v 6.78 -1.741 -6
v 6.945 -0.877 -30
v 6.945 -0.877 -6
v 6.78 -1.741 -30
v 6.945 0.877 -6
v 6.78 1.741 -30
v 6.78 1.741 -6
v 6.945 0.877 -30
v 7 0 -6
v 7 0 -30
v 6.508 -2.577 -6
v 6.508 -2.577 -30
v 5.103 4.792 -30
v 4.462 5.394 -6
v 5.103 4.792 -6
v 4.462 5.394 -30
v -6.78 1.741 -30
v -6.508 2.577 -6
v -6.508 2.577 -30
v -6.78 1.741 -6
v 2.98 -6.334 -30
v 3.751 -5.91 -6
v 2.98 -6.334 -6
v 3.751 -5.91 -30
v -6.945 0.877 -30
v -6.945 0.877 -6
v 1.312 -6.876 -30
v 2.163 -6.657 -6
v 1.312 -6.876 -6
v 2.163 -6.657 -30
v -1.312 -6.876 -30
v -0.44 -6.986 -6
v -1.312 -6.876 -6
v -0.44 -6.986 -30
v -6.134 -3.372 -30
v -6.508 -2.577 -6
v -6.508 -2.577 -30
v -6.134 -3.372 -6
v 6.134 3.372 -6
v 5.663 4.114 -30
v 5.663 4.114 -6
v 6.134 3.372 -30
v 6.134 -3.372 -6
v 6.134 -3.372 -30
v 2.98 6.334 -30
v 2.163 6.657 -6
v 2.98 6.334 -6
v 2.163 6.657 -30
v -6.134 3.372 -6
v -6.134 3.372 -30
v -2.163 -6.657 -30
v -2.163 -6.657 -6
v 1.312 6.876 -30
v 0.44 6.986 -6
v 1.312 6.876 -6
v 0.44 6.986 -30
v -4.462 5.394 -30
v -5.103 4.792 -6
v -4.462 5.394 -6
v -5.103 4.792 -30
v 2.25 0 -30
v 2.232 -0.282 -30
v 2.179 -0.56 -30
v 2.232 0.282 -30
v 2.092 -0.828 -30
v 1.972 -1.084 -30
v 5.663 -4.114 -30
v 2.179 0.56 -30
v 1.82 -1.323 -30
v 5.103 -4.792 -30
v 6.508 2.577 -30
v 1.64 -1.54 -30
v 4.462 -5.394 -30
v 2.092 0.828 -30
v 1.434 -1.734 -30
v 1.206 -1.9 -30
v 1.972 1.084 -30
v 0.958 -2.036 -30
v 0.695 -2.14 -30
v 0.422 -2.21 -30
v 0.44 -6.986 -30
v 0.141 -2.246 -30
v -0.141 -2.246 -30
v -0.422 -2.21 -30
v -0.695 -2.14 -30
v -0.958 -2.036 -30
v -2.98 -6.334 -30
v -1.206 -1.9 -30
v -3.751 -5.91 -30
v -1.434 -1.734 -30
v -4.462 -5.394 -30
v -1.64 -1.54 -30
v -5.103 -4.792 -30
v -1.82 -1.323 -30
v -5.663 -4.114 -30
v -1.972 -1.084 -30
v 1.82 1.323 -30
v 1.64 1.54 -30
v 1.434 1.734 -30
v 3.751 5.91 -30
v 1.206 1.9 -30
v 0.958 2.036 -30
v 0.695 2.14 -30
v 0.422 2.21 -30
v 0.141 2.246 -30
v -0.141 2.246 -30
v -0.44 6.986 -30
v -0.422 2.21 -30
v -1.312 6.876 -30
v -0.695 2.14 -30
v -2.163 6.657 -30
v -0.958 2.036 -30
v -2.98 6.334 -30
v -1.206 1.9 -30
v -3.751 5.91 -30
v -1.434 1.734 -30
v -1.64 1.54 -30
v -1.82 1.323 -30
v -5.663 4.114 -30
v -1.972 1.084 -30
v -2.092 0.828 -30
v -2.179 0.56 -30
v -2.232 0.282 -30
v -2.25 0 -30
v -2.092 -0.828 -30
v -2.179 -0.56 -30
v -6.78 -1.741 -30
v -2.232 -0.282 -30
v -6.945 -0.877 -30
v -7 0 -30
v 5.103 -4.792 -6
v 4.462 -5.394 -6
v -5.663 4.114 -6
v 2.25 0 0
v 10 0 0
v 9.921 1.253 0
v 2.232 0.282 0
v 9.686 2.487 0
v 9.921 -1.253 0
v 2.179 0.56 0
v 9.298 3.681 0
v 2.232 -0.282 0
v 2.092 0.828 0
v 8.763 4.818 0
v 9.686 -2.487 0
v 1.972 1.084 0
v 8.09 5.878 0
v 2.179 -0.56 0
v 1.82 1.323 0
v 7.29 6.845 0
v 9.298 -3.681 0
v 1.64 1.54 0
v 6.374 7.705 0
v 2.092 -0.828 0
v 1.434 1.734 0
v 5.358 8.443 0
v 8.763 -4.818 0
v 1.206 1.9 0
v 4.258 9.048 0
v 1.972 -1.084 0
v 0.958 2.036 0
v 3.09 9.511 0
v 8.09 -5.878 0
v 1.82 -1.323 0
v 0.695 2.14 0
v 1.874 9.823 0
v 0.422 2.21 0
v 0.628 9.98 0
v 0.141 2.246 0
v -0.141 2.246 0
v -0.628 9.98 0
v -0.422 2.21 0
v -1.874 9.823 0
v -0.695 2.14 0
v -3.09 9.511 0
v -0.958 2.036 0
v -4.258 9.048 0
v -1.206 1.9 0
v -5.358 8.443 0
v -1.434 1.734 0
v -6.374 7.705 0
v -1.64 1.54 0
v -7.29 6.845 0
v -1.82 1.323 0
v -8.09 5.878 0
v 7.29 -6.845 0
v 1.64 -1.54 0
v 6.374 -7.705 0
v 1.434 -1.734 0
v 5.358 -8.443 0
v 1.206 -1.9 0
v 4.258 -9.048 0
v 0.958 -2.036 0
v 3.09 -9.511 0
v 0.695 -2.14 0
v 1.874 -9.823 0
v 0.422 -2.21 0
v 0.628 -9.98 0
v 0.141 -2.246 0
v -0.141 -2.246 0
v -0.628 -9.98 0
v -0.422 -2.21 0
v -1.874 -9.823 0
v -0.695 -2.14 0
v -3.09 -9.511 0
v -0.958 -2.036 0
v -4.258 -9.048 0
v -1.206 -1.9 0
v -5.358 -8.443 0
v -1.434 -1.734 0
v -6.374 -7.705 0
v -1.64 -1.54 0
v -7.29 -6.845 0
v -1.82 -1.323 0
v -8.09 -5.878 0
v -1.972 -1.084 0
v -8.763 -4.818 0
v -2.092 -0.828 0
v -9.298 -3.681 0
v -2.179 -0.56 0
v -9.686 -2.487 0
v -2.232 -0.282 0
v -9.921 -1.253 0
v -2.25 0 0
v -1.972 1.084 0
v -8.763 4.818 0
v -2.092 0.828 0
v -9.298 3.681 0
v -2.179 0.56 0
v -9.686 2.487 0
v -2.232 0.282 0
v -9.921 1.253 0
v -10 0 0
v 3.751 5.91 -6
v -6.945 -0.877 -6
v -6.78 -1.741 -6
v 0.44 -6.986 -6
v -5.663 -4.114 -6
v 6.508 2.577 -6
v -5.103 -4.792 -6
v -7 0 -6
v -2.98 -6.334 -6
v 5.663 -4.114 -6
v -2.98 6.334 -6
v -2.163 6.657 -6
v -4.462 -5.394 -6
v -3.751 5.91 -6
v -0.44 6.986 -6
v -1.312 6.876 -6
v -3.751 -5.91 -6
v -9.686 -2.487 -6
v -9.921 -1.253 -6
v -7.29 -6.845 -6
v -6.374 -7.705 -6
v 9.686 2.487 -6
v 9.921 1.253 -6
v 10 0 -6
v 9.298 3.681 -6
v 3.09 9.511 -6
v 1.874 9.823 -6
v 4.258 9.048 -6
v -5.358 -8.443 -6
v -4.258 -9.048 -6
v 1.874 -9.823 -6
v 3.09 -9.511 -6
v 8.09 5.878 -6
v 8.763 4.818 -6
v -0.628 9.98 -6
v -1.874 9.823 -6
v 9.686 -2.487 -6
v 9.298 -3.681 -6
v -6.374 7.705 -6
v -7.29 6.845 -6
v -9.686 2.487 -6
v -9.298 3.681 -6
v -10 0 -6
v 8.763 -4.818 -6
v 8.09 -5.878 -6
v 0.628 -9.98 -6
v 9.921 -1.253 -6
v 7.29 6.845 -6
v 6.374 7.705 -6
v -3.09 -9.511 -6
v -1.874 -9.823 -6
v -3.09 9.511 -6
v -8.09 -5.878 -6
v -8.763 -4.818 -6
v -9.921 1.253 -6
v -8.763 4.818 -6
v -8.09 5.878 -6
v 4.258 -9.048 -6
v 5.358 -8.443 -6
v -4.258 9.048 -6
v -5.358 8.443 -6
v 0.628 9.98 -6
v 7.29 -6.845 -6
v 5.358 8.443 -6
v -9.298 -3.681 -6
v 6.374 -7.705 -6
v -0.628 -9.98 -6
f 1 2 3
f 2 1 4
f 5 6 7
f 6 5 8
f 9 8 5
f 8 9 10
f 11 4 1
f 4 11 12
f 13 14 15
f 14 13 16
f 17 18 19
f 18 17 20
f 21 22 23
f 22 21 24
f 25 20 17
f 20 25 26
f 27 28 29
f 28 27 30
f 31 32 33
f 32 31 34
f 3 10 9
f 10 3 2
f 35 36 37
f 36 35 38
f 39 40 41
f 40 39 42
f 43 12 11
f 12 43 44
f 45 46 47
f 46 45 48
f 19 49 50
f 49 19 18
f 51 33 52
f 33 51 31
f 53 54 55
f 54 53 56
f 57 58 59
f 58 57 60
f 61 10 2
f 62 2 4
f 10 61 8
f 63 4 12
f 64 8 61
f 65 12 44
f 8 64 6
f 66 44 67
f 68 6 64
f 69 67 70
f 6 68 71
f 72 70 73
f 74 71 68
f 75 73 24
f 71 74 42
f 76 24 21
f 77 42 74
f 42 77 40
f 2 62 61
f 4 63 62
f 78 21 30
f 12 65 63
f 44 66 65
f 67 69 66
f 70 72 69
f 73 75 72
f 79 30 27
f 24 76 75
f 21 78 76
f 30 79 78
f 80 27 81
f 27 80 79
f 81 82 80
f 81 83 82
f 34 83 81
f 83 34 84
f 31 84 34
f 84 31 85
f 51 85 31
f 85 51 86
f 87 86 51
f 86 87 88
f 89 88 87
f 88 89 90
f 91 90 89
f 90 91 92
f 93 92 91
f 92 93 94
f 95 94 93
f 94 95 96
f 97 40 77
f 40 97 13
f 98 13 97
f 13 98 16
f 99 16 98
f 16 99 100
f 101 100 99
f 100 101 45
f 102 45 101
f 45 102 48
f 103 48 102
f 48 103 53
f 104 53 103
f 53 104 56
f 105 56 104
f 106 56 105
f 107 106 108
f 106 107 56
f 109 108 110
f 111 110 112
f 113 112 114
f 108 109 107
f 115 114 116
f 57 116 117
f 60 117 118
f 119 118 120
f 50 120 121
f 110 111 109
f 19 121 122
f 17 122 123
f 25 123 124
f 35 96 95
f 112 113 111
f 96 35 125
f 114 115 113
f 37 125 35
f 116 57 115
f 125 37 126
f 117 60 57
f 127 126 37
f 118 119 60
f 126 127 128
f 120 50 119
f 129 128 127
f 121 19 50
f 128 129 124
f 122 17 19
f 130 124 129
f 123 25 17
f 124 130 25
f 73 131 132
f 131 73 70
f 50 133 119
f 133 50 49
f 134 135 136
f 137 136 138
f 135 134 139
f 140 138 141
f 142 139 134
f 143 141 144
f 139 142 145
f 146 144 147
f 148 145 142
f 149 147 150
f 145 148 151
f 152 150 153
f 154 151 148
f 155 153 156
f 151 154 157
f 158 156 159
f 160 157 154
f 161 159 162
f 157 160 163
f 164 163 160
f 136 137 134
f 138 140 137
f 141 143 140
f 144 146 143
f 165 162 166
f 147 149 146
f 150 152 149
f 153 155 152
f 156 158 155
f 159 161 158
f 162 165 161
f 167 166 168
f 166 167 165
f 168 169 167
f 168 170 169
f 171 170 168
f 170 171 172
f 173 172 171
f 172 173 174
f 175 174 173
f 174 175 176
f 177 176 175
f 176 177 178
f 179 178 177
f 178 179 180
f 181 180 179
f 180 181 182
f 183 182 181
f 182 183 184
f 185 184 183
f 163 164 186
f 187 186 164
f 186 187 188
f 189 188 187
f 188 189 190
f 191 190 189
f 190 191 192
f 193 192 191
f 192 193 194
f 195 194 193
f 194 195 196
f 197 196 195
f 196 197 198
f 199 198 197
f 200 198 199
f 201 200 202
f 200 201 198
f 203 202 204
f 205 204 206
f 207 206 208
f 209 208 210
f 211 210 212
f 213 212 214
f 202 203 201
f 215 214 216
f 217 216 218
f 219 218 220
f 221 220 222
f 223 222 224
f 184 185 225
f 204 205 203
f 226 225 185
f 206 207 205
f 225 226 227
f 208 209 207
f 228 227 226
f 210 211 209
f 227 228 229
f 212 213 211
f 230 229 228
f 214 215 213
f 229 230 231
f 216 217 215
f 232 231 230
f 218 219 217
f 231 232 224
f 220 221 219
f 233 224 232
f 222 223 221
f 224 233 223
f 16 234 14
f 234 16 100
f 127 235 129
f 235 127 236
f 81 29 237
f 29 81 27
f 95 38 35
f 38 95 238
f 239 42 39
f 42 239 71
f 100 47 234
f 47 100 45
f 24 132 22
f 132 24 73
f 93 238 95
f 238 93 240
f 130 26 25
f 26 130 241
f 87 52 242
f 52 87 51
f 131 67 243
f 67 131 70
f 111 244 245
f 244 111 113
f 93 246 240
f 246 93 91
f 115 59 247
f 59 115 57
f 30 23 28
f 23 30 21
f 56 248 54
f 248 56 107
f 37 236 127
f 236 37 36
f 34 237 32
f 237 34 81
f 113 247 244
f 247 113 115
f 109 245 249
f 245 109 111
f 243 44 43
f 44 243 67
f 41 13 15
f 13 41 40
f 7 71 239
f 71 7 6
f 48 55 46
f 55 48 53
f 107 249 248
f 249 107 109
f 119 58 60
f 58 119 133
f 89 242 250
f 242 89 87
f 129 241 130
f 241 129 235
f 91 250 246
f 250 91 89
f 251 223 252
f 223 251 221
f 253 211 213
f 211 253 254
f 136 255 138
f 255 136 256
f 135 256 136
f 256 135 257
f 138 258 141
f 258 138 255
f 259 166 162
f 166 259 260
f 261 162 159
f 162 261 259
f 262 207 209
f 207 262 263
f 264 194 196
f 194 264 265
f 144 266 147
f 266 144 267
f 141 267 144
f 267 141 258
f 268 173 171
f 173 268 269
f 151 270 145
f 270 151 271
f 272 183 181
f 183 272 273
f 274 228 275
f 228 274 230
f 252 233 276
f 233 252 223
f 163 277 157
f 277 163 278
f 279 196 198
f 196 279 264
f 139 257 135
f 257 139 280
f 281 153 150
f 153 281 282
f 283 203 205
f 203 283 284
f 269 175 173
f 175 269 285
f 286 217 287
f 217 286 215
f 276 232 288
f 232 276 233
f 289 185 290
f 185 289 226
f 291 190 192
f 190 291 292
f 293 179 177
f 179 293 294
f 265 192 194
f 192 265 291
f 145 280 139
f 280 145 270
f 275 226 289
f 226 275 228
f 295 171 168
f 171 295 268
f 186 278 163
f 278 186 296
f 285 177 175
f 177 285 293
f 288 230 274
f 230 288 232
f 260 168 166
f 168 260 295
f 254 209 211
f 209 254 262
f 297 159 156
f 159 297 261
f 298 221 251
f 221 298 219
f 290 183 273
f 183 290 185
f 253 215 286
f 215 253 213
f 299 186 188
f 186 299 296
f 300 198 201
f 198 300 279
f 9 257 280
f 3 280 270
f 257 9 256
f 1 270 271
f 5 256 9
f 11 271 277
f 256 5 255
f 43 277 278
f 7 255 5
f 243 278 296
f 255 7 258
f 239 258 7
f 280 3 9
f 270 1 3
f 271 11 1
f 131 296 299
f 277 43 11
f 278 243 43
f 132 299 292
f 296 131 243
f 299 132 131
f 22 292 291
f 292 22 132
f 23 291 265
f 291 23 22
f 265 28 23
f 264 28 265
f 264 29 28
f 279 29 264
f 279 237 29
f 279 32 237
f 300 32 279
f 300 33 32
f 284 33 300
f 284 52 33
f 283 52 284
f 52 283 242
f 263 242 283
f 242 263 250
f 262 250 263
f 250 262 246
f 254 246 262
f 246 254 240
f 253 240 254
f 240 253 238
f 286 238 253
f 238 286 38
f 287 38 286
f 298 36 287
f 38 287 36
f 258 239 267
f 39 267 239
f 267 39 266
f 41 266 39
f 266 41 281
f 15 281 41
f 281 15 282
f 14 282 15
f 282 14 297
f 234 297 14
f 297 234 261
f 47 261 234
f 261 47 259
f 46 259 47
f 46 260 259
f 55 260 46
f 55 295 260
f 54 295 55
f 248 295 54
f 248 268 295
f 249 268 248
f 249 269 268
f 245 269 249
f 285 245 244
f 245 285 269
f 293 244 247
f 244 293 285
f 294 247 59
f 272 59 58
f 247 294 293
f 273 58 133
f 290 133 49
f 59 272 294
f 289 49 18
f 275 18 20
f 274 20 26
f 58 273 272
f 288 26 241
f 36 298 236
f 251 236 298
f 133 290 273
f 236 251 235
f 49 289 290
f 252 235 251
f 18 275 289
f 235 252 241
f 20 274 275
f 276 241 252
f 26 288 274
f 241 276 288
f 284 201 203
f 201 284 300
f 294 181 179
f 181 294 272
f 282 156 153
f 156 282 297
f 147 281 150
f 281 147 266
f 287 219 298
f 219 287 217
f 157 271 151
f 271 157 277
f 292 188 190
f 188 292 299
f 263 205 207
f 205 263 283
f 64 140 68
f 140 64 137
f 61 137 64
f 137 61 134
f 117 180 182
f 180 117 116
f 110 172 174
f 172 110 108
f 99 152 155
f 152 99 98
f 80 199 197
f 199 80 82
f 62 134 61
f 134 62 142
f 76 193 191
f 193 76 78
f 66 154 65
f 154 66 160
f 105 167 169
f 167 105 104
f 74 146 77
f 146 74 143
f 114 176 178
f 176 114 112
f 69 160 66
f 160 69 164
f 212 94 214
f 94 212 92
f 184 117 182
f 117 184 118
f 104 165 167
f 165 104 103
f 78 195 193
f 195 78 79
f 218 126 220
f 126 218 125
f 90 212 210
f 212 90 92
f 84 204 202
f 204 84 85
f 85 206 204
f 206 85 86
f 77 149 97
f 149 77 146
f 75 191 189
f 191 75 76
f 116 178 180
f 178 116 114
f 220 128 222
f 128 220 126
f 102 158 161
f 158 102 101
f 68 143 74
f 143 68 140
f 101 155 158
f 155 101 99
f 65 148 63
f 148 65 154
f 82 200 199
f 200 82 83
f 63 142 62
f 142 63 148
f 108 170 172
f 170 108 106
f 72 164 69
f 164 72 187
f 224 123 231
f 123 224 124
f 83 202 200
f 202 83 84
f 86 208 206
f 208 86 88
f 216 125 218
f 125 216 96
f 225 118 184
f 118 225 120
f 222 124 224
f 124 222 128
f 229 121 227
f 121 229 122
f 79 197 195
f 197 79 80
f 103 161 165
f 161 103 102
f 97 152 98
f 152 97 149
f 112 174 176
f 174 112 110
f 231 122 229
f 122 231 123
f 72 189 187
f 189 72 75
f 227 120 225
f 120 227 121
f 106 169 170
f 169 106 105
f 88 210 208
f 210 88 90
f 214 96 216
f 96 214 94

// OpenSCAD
$fn = 50;


difference() {
	union() {
		translate(v = [0, 0, -30.0000000000]) {
			cylinder(h = 30, r = 7.0000000000);
		}
		translate(v = [0, 0, -6.0000000000]) {
			cylinder(h = 6, r = 10.0000000000);
		}
	}
	union() {
		#translate(v = [0, 0, -30]) {
			cylinder(h = 30, r = 2.2500000000);
		}
	}
}
